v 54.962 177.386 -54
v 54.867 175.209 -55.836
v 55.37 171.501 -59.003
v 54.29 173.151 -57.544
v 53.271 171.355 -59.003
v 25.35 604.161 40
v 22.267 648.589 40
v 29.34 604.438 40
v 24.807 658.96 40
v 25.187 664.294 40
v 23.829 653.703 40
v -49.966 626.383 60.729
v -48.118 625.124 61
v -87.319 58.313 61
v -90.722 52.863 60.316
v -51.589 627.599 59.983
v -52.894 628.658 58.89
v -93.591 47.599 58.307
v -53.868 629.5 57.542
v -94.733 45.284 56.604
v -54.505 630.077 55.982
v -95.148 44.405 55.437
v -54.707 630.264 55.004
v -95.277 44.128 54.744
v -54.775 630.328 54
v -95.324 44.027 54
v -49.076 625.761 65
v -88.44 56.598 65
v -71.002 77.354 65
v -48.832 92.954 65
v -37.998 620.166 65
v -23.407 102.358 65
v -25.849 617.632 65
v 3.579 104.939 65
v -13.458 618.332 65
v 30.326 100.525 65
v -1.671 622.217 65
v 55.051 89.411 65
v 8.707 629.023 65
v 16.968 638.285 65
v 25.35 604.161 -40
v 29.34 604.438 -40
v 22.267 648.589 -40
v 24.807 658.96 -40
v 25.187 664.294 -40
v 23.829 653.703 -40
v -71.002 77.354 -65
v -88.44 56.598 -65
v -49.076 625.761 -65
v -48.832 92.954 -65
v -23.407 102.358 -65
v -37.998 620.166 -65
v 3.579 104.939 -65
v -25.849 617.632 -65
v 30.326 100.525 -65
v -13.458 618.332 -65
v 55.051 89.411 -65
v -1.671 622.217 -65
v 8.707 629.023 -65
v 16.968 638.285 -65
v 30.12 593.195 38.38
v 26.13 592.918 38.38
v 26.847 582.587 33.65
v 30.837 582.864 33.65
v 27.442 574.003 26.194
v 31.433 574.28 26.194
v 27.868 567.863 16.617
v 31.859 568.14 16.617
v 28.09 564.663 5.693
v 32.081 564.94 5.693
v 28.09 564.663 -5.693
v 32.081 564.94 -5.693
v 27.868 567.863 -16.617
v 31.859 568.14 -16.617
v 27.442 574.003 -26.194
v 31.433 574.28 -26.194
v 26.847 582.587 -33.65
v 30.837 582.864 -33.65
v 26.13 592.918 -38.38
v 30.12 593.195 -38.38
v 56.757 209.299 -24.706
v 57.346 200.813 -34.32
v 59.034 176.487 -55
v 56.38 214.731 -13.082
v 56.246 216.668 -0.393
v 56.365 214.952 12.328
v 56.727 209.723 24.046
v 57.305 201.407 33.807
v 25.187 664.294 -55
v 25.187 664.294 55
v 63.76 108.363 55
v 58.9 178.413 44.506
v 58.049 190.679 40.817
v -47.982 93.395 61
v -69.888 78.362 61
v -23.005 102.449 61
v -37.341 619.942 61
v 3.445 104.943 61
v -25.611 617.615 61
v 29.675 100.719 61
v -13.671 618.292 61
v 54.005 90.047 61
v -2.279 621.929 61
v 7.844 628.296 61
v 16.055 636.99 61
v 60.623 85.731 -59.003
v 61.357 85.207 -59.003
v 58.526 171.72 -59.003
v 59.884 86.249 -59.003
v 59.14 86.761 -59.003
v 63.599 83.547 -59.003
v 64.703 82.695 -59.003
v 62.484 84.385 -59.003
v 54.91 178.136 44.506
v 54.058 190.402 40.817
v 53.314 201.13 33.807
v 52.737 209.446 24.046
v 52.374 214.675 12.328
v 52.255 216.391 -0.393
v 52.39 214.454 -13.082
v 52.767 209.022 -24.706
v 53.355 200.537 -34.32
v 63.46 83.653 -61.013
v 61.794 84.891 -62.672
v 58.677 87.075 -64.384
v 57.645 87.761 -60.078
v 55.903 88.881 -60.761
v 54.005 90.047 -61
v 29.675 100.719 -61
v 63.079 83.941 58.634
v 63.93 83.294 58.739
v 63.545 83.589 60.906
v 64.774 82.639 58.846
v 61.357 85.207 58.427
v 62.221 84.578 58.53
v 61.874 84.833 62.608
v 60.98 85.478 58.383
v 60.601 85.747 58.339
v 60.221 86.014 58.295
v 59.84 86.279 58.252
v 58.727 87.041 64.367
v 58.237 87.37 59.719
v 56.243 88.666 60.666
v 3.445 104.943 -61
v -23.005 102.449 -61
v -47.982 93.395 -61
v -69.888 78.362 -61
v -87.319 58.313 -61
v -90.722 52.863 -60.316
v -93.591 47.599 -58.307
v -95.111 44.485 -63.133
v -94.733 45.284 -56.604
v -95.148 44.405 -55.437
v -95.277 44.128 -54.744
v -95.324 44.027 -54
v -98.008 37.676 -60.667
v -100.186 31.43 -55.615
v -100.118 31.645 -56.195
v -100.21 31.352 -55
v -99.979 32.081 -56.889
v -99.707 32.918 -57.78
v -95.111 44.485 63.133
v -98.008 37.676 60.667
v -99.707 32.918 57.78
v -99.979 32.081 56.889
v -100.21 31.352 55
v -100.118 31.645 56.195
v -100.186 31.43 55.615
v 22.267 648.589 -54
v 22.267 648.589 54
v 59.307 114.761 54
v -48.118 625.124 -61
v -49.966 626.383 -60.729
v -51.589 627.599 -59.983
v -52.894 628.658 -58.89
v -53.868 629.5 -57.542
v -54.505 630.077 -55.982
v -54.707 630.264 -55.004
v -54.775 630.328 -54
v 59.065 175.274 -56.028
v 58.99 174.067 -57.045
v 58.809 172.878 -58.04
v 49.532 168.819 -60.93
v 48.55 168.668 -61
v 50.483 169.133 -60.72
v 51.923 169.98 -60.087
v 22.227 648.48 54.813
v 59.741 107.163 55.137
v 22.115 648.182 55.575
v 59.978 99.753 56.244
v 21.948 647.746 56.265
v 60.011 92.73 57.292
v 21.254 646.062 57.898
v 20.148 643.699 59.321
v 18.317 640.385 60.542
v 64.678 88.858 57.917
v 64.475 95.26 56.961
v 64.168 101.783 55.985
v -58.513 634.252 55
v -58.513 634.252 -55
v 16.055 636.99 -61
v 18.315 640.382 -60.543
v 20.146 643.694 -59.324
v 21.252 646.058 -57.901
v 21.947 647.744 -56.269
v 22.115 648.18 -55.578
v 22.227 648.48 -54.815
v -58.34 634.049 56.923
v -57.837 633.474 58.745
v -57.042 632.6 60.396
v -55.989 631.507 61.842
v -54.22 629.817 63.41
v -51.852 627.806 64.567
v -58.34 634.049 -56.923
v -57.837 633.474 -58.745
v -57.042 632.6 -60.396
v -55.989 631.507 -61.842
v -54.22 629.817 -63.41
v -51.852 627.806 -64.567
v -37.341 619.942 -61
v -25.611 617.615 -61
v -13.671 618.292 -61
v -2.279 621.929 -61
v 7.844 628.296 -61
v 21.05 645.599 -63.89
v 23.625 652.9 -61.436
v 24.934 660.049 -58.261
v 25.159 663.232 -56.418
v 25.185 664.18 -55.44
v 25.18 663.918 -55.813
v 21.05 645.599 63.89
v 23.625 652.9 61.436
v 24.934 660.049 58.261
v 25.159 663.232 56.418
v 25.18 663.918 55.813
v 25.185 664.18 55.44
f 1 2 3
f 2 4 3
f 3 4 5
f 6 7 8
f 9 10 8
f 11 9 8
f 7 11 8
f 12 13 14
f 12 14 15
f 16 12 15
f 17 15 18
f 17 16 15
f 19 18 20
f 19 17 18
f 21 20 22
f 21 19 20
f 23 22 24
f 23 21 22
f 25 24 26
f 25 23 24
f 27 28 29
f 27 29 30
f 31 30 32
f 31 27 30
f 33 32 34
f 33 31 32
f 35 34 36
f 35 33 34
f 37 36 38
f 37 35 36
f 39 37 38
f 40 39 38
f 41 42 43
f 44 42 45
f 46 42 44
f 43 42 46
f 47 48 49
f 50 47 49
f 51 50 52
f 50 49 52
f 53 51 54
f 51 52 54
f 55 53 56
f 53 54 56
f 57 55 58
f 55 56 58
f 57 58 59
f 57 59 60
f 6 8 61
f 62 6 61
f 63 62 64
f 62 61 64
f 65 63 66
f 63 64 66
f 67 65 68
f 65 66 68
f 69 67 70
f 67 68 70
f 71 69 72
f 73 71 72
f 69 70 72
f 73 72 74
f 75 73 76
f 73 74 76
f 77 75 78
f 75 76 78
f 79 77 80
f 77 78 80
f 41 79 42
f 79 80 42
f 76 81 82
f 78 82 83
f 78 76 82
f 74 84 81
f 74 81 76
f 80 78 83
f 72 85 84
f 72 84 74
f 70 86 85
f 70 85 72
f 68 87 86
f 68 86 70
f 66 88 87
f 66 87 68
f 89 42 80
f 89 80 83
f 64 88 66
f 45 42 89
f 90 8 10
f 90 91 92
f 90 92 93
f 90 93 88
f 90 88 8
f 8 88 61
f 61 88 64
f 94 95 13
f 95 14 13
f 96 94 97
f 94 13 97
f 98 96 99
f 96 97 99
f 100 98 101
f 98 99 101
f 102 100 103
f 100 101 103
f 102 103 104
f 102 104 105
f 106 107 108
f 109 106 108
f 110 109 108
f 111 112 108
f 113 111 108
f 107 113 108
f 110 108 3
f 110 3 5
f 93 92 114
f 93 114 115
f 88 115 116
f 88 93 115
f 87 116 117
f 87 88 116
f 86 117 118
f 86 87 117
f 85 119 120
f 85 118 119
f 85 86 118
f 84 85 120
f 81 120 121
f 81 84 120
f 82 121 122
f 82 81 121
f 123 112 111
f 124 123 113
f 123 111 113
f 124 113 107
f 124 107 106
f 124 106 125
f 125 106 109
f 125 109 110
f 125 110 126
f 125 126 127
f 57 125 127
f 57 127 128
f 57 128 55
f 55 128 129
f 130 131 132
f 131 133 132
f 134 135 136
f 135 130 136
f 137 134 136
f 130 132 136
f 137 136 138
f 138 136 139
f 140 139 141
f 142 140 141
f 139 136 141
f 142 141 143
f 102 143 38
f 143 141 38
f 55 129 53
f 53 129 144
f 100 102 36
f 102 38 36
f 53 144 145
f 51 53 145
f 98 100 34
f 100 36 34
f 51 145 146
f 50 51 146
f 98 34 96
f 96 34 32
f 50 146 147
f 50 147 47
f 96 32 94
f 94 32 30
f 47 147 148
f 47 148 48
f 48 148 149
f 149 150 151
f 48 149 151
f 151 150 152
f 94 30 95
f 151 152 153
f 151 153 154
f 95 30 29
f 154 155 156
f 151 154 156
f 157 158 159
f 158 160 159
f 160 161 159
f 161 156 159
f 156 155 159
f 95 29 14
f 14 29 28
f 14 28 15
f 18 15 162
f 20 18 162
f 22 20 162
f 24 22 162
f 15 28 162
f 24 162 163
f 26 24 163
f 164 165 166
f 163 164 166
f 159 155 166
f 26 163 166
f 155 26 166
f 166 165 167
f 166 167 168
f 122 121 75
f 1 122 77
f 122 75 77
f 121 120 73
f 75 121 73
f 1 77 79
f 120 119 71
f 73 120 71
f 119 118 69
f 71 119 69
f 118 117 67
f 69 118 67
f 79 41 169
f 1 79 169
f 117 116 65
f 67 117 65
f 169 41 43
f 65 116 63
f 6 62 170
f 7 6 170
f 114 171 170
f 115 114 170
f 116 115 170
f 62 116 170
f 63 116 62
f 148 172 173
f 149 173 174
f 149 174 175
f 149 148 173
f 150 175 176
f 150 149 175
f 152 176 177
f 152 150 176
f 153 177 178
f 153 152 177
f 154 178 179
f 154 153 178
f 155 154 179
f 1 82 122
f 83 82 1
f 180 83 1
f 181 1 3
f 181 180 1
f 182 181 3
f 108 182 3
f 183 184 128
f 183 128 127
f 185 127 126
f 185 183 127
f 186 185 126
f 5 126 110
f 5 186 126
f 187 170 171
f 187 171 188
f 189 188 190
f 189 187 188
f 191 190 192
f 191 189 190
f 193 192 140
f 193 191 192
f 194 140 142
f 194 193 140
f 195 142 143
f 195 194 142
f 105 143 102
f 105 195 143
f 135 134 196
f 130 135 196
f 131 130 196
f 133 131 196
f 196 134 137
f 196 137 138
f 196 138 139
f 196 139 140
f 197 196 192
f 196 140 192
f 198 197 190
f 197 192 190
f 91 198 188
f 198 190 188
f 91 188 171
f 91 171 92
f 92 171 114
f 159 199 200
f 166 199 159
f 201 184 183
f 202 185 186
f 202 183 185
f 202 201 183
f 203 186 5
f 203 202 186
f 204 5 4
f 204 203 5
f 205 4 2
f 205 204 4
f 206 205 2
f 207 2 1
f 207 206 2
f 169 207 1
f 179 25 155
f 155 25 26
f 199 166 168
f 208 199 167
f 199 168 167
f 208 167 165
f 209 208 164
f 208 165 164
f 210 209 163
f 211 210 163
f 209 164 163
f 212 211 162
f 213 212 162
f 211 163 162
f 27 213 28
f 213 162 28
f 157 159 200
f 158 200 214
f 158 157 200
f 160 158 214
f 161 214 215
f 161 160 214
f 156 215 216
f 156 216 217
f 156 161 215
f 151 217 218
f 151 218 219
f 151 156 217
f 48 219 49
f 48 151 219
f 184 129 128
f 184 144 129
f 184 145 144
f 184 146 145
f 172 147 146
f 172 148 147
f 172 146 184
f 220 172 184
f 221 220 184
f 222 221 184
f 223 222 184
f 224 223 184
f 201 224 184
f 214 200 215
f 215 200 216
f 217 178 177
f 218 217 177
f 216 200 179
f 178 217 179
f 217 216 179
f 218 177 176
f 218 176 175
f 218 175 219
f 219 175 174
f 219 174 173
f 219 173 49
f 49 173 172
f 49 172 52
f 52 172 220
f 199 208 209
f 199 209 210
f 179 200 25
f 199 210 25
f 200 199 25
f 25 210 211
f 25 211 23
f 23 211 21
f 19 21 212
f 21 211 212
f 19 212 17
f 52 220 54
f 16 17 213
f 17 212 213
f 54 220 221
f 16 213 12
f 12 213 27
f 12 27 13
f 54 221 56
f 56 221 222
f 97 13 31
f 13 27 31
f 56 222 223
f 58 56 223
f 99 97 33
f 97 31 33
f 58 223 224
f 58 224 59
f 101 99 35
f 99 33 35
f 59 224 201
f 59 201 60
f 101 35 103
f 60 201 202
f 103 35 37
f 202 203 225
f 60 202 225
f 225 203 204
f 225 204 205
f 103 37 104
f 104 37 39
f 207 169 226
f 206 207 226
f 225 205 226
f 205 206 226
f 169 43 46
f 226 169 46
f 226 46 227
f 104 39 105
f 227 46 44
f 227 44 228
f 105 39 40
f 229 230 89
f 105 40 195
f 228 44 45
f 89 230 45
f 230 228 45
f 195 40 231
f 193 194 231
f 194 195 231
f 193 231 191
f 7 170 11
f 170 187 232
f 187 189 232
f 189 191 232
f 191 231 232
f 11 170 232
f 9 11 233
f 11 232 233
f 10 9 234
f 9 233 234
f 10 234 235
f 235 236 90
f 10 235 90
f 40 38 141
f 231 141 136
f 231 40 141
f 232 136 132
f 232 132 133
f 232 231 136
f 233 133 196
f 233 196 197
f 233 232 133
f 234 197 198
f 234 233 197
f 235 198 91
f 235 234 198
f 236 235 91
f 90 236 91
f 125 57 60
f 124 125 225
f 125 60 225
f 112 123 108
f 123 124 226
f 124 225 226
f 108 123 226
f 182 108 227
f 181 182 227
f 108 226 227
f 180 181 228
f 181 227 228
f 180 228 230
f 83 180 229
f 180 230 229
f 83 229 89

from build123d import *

# Parameters (mm, degrees)
EXTRUDE_1_DEPTH     = 65
SHELL_1_T           = -4
CUT_EXTRUDE_1_REACH = 686.315
CUT_EXTRUDE_2_REACH = 686.315
FILLET_2_R          = 10
FILLET_3_R          = 7


with BuildPart() as part:
    # 草图1 → 凸台-拉伸1 (new, symmetric)
    with BuildSketch(Plane.XY):
        with BuildLine():
            Line((-58.512960007, 634.252160061), (-100.209989819, 31.352160061))
            ThreePointArc((-100.209989819, 31.352160061), (-30.672049595, 100.420243844), (65.590010181, 81.993600753))
            Line((65.590010181, 81.993600753), (25.187039993, 664.293600753))
            ThreePointArc((25.187039993, 664.293600753), (-6.261361418, 620.292452643), (-58.512960007, 634.252160061))
        make_face()
    extrude(amount=EXTRUDE_1_DEPTH, both=True)

    # 抽壳1
    shell_1_openings = [part.faces().sort_by_distance(p)[0] for p in [
        (-30.672049595, 100.420243844, 0),
        (-6.261361418, 620.292452643, 0),
    ]]
    offset(amount=SHELL_1_T, openings=shell_1_openings, kind=Kind.INTERSECTION)

    # 草图2 → 切除-拉伸1 (cut, up to next)
    with BuildSketch(Plane(origin=(70.93763316, 4.922017994, 0), x_dir=(0, 0, -1), z_dir=(0.9976015076237793, 0.06921872569444461, 0)), mode=Mode.PRIVATE) as cut_extrude_1_sk1:
        with BuildLine():
            Line((-40, 660.956882804), (-40, 600.956882804))
            ThreePointArc((-40, 600.956882804), (0, 560.956882804), (40, 600.956882804))
            Line((40, 600.956882804), (40, 660.956882804))
            Line((40, 660.956882804), (-40, 660.956882804))
        make_face()
    cut_extrude_1_tool1 = extrude(cut_extrude_1_sk1.sketch, amount=-CUT_EXTRUDE_1_REACH, mode=Mode.PRIVATE) & part.part
    add(cut_extrude_1_tool1.solids().sort_by_distance((28.381063, 618.26036, 0))[0], mode=Mode.SUBTRACT)

    # 草图3 → 切除-拉伸2 (cut, up to next)
    with BuildSketch(Plane(origin=(70.93763316, 4.922017994, 0), x_dir=(0, 0, -1), z_dir=(0.9976015076237793, 0.06921872569444461, 0)), mode=Mode.PRIVATE) as cut_extrude_2_sk1:
        with BuildLine():
            Line((-58.950365875, 77.256882804), (-44.505713851, 173.908306305))
            ThreePointArc((-44.505713851, 173.908306305), (-12.328164841, 210.535241733), (34.320074836, 196.362422882))
            Line((34.320074836, 196.362422882), (59.003367844, 167.256882804))
            Line((59.003367844, 167.256882804), (59.003367844, 77.256882804))
            Line((59.003367844, 77.256882804), (-58.950365875, 77.256882804))
        make_face()
    cut_extrude_2_tool1 = extrude(cut_extrude_2_sk1.sketch, amount=-CUT_EXTRUDE_2_REACH, mode=Mode.PRIVATE) & part.part
    add(cut_extrude_2_tool1.solids().sort_by_distance((61.423964, 142.035935, -3.018476))[0], mode=Mode.SUBTRACT)

    # 圆角2
    fillet_2_edges = [part.edges().sort_by_distance(p)[0] for p in [
        (45.388525087, 373.143600753, -65),
        (45.388525087, 373.143600753, 65),
        (-79.361474913, 332.802160061, 65),
        (-79.361474913, 332.802160061, -65),
    ]]
    fillet(fillet_2_edges, radius=FILLET_2_R)

    # 圆角3
    # the kernel refuses this fillet: 7 mm, written as the material it adds along each edge
    with BuildSketch(Plane(origin=(-53.567364395, 647.786430481, 61), x_dir=(0, 0, -1), z_dir=(-0.06899595830556898, -0.9976169393797883, 0))) as fillet_3_piece_1_section:
        with BuildLine():
            CenterArc((FILLET_3_R, FILLET_3_R), FILLET_3_R, 180, 90)
            Line((0, FILLET_3_R), (0, 0))
            Line((0, 0), (FILLET_3_R, 0))
        make_face()
    fillet_3_piece_1 = extrude(amount=622.701795047, mode=Mode.PRIVATE)
    fillet_3_piece_1 = fillet_3_piece_1 - Plane(origin=(-22.307707086, 665, 59.408269391), x_dir=(0.9998894121907572, -0.014871563092767819, 0), z_dir=(0, 0, 1)) * Cylinder(47.5, 1274, mode=Mode.PRIVATE)
    fillet_3_piece_1 = fillet_3_piece_1 - Plane(origin=(0, 0, 59.408269391), x_dir=(-0.9543808554191496, 0.29859200057840163, 0), z_dir=(0, 0, 1)) * Cylinder(105, 1274, mode=Mode.PRIVATE)
    add(fillet_3_piece_1)
    with BuildSketch(Plane(origin=(21.055790856, 666.046599906, -61), x_dir=(0, 0, 1), z_dir=(0.06921872569444461, -0.9976015076237793, 0))) as fillet_3_piece_2_section:
        with BuildLine():
            CenterArc((FILLET_3_R, FILLET_3_R), FILLET_3_R, 180, 90)
            Line((0, FILLET_3_R), (0, 0))
            Line((0, 0), (FILLET_3_R, 0))
        make_face()
    fillet_3_piece_2 = extrude(amount=599.735885548, mode=Mode.PRIVATE)
    fillet_3_piece_2 = fillet_3_piece_2 - Plane(origin=(-22.307707086, 665, -57.567140741), x_dir=(0.9998894121907572, -0.014871563092767819, 0), z_dir=(0, 0, 1)) * Cylinder(47.5, 1228, mode=Mode.PRIVATE)
    fillet_3_piece_2 = split(fillet_3_piece_2, bisect_by=Plane(origin=(45.190808802, 311.119705723, 59.715559847), z_dir=(-0.04476996432990456, 0.6452384591552827, -0.7626683296956915)), keep=Keep.TOP, mode=Mode.PRIVATE)
    fillet_3_piece_2 = split(fillet_3_piece_2, bisect_by=Plane(origin=(38.306109231, 410.34410782, -59.003367844), z_dir=(0, 0, 1)), keep=Keep.TOP, mode=Mode.PRIVATE)
    add(fillet_3_piece_2)
    with BuildSketch(Plane(origin=(21.055790856, 666.046599906, -61), x_dir=(0, 0, 1), z_dir=(0.06921872569444461, -0.9976015076237793, 0))) as fillet_3_piece_3_section:
        with BuildLine():
            CenterArc((FILLET_3_R, FILLET_3_R), FILLET_3_R, 180, 90)
            Line((0, FILLET_3_R), (0, 0))
            Line((0, 0), (FILLET_3_R, 0))
        make_face()
    fillet_3_piece_3 = extrude(amount=599.735885548, mode=Mode.PRIVATE)
    fillet_3_piece_3 = fillet_3_piece_3 - Plane(origin=(-22.307707086, 665, -60.275474349), x_dir=(0.9998894121907572, -0.014871563092767819, 0), z_dir=(0, 0, 1)) * Cylinder(47.5, 1228, mode=Mode.PRIVATE)
    fillet_3_piece_3 = split(fillet_3_piece_3, bisect_by=Plane(origin=(43.813424167, 307.914474781, 57.084700881), z_dir=(-0.04476996432990456, 0.6452384591552827, -0.7626683296956915)), keep=Keep.TOP, mode=Mode.PRIVATE)
    fillet_3_piece_3 = split(fillet_3_piece_3, bisect_by=Plane(origin=(36.9241767, 407.204422564, -59.003367844), z_dir=(0, 0, -1)), keep=Keep.TOP, mode=Mode.PRIVATE)
    add(fillet_3_piece_3)
    with BuildSketch(Plane(origin=(21.055790856, 666.046599906, -61), x_dir=(0, 0, 1), z_dir=(0.06921872569444461, -0.9976015076237793, 0))) as fillet_3_piece_4_section:
        with BuildLine():
            CenterArc((FILLET_3_R, FILLET_3_R), FILLET_3_R, 180, 90)
            Line((0, FILLET_3_R), (0, 0))
            Line((0, 0), (FILLET_3_R, 0))
        make_face()
    fillet_3_piece_4 = extrude(amount=599.735885548, mode=Mode.PRIVATE)
    fillet_3_piece_4 = split(fillet_3_piece_4, bisect_by=Plane(origin=(55.090839822, 145.685566131, -80.827437921), z_dir=(0.04476996432990456, -0.6452384591552827, 0.7626683296956915)), keep=Keep.TOP, mode=Mode.PRIVATE)
    fillet_3_piece_4 = fillet_3_piece_4 - Plane(origin=(0, 0, -60.266827154), x_dir=(-0.9543808554191496, 0.29859200057840163, 0), z_dir=(0, 0, 1)) * Cylinder(105, 1228, mode=Mode.PRIVATE)
    fillet_3_piece_4 = split(fillet_3_piece_4, bisect_by=Plane(origin=(56.29778362, 128.290721879, -59.003367844), z_dir=(0, 0, -1)), keep=Keep.TOP, mode=Mode.PRIVATE)
    add(fillet_3_piece_4)
    with BuildSketch(Plane(origin=(-96.531271483, 26.56857156, -61), x_dir=(0.9976169393797882, -0.06899595830556898, 0), z_dir=(0.06899595830556898, 0.9976169393797883, 0))) as fillet_3_piece_5_section:
        with BuildLine():
            CenterArc((FILLET_3_R, -FILLET_3_R), FILLET_3_R, 90, 90)
            Line((0, -FILLET_3_R), (0, 0))
            Line((0, 0), (FILLET_3_R, 0))
        make_face()
    fillet_3_piece_5 = extrude(amount=622.701795047, mode=Mode.PRIVATE)
    fillet_3_piece_5 = fillet_3_piece_5 - Plane(origin=(-22.307707086, 665, -59.408268286), x_dir=(0.9998894121907572, -0.014871563092767819, 0), z_dir=(0, 0, 1)) * Cylinder(47.5, 1274, mode=Mode.PRIVATE)
    fillet_3_piece_5 = fillet_3_piece_5 - Plane(origin=(0, 0, -59.408268286), x_dir=(-0.9543808554191496, 0.29859200057840163, 0), z_dir=(0, 0, 1)) * Cylinder(105, 1274, mode=Mode.PRIVATE)
    add(fillet_3_piece_5)
    with BuildSketch(Plane(origin=(21.055790856, 666.046599906, 61), x_dir=(0, 0, -1), z_dir=(0.06921872569444461, -0.9976015076237793, 0))) as fillet_3_piece_6_section:
        with BuildLine():
            CenterArc((FILLET_3_R, -FILLET_3_R), FILLET_3_R, 90, 90)
            Line((0, -FILLET_3_R), (0, 0))
            Line((0, 0), (FILLET_3_R, 0))
        make_face()
    fillet_3_piece_6 = extrude(amount=599.735885548, mode=Mode.PRIVATE)
    fillet_3_piece_6 = fillet_3_piece_6 - Plane(origin=(-22.307707086, 665, 59.420291377), x_dir=(0.9998894121907572, -0.014871563092767819, 0), z_dir=(0, 0, 1)) * Cylinder(47.5, 1228, mode=Mode.PRIVATE)
    fillet_3_piece_6 = split(fillet_3_piece_6, bisect_by=Plane(origin=(40.666871165, 360.585918915, 17.156503264), z_dir=(-0.010231179084037917, 0.1474548913838828, 0.9890158633619169)), keep=Keep.TOP, mode=Mode.PRIVATE)
    fillet_3_piece_6 = fillet_3_piece_6 - Plane(origin=(0, 0, 59.420291377), x_dir=(-0.9543808554191496, 0.29859200057840163, 0), z_dir=(0, 0, 1)) * Cylinder(105, 1228, mode=Mode.PRIVATE)
    add(fillet_3_piece_6)


solid = part.part
